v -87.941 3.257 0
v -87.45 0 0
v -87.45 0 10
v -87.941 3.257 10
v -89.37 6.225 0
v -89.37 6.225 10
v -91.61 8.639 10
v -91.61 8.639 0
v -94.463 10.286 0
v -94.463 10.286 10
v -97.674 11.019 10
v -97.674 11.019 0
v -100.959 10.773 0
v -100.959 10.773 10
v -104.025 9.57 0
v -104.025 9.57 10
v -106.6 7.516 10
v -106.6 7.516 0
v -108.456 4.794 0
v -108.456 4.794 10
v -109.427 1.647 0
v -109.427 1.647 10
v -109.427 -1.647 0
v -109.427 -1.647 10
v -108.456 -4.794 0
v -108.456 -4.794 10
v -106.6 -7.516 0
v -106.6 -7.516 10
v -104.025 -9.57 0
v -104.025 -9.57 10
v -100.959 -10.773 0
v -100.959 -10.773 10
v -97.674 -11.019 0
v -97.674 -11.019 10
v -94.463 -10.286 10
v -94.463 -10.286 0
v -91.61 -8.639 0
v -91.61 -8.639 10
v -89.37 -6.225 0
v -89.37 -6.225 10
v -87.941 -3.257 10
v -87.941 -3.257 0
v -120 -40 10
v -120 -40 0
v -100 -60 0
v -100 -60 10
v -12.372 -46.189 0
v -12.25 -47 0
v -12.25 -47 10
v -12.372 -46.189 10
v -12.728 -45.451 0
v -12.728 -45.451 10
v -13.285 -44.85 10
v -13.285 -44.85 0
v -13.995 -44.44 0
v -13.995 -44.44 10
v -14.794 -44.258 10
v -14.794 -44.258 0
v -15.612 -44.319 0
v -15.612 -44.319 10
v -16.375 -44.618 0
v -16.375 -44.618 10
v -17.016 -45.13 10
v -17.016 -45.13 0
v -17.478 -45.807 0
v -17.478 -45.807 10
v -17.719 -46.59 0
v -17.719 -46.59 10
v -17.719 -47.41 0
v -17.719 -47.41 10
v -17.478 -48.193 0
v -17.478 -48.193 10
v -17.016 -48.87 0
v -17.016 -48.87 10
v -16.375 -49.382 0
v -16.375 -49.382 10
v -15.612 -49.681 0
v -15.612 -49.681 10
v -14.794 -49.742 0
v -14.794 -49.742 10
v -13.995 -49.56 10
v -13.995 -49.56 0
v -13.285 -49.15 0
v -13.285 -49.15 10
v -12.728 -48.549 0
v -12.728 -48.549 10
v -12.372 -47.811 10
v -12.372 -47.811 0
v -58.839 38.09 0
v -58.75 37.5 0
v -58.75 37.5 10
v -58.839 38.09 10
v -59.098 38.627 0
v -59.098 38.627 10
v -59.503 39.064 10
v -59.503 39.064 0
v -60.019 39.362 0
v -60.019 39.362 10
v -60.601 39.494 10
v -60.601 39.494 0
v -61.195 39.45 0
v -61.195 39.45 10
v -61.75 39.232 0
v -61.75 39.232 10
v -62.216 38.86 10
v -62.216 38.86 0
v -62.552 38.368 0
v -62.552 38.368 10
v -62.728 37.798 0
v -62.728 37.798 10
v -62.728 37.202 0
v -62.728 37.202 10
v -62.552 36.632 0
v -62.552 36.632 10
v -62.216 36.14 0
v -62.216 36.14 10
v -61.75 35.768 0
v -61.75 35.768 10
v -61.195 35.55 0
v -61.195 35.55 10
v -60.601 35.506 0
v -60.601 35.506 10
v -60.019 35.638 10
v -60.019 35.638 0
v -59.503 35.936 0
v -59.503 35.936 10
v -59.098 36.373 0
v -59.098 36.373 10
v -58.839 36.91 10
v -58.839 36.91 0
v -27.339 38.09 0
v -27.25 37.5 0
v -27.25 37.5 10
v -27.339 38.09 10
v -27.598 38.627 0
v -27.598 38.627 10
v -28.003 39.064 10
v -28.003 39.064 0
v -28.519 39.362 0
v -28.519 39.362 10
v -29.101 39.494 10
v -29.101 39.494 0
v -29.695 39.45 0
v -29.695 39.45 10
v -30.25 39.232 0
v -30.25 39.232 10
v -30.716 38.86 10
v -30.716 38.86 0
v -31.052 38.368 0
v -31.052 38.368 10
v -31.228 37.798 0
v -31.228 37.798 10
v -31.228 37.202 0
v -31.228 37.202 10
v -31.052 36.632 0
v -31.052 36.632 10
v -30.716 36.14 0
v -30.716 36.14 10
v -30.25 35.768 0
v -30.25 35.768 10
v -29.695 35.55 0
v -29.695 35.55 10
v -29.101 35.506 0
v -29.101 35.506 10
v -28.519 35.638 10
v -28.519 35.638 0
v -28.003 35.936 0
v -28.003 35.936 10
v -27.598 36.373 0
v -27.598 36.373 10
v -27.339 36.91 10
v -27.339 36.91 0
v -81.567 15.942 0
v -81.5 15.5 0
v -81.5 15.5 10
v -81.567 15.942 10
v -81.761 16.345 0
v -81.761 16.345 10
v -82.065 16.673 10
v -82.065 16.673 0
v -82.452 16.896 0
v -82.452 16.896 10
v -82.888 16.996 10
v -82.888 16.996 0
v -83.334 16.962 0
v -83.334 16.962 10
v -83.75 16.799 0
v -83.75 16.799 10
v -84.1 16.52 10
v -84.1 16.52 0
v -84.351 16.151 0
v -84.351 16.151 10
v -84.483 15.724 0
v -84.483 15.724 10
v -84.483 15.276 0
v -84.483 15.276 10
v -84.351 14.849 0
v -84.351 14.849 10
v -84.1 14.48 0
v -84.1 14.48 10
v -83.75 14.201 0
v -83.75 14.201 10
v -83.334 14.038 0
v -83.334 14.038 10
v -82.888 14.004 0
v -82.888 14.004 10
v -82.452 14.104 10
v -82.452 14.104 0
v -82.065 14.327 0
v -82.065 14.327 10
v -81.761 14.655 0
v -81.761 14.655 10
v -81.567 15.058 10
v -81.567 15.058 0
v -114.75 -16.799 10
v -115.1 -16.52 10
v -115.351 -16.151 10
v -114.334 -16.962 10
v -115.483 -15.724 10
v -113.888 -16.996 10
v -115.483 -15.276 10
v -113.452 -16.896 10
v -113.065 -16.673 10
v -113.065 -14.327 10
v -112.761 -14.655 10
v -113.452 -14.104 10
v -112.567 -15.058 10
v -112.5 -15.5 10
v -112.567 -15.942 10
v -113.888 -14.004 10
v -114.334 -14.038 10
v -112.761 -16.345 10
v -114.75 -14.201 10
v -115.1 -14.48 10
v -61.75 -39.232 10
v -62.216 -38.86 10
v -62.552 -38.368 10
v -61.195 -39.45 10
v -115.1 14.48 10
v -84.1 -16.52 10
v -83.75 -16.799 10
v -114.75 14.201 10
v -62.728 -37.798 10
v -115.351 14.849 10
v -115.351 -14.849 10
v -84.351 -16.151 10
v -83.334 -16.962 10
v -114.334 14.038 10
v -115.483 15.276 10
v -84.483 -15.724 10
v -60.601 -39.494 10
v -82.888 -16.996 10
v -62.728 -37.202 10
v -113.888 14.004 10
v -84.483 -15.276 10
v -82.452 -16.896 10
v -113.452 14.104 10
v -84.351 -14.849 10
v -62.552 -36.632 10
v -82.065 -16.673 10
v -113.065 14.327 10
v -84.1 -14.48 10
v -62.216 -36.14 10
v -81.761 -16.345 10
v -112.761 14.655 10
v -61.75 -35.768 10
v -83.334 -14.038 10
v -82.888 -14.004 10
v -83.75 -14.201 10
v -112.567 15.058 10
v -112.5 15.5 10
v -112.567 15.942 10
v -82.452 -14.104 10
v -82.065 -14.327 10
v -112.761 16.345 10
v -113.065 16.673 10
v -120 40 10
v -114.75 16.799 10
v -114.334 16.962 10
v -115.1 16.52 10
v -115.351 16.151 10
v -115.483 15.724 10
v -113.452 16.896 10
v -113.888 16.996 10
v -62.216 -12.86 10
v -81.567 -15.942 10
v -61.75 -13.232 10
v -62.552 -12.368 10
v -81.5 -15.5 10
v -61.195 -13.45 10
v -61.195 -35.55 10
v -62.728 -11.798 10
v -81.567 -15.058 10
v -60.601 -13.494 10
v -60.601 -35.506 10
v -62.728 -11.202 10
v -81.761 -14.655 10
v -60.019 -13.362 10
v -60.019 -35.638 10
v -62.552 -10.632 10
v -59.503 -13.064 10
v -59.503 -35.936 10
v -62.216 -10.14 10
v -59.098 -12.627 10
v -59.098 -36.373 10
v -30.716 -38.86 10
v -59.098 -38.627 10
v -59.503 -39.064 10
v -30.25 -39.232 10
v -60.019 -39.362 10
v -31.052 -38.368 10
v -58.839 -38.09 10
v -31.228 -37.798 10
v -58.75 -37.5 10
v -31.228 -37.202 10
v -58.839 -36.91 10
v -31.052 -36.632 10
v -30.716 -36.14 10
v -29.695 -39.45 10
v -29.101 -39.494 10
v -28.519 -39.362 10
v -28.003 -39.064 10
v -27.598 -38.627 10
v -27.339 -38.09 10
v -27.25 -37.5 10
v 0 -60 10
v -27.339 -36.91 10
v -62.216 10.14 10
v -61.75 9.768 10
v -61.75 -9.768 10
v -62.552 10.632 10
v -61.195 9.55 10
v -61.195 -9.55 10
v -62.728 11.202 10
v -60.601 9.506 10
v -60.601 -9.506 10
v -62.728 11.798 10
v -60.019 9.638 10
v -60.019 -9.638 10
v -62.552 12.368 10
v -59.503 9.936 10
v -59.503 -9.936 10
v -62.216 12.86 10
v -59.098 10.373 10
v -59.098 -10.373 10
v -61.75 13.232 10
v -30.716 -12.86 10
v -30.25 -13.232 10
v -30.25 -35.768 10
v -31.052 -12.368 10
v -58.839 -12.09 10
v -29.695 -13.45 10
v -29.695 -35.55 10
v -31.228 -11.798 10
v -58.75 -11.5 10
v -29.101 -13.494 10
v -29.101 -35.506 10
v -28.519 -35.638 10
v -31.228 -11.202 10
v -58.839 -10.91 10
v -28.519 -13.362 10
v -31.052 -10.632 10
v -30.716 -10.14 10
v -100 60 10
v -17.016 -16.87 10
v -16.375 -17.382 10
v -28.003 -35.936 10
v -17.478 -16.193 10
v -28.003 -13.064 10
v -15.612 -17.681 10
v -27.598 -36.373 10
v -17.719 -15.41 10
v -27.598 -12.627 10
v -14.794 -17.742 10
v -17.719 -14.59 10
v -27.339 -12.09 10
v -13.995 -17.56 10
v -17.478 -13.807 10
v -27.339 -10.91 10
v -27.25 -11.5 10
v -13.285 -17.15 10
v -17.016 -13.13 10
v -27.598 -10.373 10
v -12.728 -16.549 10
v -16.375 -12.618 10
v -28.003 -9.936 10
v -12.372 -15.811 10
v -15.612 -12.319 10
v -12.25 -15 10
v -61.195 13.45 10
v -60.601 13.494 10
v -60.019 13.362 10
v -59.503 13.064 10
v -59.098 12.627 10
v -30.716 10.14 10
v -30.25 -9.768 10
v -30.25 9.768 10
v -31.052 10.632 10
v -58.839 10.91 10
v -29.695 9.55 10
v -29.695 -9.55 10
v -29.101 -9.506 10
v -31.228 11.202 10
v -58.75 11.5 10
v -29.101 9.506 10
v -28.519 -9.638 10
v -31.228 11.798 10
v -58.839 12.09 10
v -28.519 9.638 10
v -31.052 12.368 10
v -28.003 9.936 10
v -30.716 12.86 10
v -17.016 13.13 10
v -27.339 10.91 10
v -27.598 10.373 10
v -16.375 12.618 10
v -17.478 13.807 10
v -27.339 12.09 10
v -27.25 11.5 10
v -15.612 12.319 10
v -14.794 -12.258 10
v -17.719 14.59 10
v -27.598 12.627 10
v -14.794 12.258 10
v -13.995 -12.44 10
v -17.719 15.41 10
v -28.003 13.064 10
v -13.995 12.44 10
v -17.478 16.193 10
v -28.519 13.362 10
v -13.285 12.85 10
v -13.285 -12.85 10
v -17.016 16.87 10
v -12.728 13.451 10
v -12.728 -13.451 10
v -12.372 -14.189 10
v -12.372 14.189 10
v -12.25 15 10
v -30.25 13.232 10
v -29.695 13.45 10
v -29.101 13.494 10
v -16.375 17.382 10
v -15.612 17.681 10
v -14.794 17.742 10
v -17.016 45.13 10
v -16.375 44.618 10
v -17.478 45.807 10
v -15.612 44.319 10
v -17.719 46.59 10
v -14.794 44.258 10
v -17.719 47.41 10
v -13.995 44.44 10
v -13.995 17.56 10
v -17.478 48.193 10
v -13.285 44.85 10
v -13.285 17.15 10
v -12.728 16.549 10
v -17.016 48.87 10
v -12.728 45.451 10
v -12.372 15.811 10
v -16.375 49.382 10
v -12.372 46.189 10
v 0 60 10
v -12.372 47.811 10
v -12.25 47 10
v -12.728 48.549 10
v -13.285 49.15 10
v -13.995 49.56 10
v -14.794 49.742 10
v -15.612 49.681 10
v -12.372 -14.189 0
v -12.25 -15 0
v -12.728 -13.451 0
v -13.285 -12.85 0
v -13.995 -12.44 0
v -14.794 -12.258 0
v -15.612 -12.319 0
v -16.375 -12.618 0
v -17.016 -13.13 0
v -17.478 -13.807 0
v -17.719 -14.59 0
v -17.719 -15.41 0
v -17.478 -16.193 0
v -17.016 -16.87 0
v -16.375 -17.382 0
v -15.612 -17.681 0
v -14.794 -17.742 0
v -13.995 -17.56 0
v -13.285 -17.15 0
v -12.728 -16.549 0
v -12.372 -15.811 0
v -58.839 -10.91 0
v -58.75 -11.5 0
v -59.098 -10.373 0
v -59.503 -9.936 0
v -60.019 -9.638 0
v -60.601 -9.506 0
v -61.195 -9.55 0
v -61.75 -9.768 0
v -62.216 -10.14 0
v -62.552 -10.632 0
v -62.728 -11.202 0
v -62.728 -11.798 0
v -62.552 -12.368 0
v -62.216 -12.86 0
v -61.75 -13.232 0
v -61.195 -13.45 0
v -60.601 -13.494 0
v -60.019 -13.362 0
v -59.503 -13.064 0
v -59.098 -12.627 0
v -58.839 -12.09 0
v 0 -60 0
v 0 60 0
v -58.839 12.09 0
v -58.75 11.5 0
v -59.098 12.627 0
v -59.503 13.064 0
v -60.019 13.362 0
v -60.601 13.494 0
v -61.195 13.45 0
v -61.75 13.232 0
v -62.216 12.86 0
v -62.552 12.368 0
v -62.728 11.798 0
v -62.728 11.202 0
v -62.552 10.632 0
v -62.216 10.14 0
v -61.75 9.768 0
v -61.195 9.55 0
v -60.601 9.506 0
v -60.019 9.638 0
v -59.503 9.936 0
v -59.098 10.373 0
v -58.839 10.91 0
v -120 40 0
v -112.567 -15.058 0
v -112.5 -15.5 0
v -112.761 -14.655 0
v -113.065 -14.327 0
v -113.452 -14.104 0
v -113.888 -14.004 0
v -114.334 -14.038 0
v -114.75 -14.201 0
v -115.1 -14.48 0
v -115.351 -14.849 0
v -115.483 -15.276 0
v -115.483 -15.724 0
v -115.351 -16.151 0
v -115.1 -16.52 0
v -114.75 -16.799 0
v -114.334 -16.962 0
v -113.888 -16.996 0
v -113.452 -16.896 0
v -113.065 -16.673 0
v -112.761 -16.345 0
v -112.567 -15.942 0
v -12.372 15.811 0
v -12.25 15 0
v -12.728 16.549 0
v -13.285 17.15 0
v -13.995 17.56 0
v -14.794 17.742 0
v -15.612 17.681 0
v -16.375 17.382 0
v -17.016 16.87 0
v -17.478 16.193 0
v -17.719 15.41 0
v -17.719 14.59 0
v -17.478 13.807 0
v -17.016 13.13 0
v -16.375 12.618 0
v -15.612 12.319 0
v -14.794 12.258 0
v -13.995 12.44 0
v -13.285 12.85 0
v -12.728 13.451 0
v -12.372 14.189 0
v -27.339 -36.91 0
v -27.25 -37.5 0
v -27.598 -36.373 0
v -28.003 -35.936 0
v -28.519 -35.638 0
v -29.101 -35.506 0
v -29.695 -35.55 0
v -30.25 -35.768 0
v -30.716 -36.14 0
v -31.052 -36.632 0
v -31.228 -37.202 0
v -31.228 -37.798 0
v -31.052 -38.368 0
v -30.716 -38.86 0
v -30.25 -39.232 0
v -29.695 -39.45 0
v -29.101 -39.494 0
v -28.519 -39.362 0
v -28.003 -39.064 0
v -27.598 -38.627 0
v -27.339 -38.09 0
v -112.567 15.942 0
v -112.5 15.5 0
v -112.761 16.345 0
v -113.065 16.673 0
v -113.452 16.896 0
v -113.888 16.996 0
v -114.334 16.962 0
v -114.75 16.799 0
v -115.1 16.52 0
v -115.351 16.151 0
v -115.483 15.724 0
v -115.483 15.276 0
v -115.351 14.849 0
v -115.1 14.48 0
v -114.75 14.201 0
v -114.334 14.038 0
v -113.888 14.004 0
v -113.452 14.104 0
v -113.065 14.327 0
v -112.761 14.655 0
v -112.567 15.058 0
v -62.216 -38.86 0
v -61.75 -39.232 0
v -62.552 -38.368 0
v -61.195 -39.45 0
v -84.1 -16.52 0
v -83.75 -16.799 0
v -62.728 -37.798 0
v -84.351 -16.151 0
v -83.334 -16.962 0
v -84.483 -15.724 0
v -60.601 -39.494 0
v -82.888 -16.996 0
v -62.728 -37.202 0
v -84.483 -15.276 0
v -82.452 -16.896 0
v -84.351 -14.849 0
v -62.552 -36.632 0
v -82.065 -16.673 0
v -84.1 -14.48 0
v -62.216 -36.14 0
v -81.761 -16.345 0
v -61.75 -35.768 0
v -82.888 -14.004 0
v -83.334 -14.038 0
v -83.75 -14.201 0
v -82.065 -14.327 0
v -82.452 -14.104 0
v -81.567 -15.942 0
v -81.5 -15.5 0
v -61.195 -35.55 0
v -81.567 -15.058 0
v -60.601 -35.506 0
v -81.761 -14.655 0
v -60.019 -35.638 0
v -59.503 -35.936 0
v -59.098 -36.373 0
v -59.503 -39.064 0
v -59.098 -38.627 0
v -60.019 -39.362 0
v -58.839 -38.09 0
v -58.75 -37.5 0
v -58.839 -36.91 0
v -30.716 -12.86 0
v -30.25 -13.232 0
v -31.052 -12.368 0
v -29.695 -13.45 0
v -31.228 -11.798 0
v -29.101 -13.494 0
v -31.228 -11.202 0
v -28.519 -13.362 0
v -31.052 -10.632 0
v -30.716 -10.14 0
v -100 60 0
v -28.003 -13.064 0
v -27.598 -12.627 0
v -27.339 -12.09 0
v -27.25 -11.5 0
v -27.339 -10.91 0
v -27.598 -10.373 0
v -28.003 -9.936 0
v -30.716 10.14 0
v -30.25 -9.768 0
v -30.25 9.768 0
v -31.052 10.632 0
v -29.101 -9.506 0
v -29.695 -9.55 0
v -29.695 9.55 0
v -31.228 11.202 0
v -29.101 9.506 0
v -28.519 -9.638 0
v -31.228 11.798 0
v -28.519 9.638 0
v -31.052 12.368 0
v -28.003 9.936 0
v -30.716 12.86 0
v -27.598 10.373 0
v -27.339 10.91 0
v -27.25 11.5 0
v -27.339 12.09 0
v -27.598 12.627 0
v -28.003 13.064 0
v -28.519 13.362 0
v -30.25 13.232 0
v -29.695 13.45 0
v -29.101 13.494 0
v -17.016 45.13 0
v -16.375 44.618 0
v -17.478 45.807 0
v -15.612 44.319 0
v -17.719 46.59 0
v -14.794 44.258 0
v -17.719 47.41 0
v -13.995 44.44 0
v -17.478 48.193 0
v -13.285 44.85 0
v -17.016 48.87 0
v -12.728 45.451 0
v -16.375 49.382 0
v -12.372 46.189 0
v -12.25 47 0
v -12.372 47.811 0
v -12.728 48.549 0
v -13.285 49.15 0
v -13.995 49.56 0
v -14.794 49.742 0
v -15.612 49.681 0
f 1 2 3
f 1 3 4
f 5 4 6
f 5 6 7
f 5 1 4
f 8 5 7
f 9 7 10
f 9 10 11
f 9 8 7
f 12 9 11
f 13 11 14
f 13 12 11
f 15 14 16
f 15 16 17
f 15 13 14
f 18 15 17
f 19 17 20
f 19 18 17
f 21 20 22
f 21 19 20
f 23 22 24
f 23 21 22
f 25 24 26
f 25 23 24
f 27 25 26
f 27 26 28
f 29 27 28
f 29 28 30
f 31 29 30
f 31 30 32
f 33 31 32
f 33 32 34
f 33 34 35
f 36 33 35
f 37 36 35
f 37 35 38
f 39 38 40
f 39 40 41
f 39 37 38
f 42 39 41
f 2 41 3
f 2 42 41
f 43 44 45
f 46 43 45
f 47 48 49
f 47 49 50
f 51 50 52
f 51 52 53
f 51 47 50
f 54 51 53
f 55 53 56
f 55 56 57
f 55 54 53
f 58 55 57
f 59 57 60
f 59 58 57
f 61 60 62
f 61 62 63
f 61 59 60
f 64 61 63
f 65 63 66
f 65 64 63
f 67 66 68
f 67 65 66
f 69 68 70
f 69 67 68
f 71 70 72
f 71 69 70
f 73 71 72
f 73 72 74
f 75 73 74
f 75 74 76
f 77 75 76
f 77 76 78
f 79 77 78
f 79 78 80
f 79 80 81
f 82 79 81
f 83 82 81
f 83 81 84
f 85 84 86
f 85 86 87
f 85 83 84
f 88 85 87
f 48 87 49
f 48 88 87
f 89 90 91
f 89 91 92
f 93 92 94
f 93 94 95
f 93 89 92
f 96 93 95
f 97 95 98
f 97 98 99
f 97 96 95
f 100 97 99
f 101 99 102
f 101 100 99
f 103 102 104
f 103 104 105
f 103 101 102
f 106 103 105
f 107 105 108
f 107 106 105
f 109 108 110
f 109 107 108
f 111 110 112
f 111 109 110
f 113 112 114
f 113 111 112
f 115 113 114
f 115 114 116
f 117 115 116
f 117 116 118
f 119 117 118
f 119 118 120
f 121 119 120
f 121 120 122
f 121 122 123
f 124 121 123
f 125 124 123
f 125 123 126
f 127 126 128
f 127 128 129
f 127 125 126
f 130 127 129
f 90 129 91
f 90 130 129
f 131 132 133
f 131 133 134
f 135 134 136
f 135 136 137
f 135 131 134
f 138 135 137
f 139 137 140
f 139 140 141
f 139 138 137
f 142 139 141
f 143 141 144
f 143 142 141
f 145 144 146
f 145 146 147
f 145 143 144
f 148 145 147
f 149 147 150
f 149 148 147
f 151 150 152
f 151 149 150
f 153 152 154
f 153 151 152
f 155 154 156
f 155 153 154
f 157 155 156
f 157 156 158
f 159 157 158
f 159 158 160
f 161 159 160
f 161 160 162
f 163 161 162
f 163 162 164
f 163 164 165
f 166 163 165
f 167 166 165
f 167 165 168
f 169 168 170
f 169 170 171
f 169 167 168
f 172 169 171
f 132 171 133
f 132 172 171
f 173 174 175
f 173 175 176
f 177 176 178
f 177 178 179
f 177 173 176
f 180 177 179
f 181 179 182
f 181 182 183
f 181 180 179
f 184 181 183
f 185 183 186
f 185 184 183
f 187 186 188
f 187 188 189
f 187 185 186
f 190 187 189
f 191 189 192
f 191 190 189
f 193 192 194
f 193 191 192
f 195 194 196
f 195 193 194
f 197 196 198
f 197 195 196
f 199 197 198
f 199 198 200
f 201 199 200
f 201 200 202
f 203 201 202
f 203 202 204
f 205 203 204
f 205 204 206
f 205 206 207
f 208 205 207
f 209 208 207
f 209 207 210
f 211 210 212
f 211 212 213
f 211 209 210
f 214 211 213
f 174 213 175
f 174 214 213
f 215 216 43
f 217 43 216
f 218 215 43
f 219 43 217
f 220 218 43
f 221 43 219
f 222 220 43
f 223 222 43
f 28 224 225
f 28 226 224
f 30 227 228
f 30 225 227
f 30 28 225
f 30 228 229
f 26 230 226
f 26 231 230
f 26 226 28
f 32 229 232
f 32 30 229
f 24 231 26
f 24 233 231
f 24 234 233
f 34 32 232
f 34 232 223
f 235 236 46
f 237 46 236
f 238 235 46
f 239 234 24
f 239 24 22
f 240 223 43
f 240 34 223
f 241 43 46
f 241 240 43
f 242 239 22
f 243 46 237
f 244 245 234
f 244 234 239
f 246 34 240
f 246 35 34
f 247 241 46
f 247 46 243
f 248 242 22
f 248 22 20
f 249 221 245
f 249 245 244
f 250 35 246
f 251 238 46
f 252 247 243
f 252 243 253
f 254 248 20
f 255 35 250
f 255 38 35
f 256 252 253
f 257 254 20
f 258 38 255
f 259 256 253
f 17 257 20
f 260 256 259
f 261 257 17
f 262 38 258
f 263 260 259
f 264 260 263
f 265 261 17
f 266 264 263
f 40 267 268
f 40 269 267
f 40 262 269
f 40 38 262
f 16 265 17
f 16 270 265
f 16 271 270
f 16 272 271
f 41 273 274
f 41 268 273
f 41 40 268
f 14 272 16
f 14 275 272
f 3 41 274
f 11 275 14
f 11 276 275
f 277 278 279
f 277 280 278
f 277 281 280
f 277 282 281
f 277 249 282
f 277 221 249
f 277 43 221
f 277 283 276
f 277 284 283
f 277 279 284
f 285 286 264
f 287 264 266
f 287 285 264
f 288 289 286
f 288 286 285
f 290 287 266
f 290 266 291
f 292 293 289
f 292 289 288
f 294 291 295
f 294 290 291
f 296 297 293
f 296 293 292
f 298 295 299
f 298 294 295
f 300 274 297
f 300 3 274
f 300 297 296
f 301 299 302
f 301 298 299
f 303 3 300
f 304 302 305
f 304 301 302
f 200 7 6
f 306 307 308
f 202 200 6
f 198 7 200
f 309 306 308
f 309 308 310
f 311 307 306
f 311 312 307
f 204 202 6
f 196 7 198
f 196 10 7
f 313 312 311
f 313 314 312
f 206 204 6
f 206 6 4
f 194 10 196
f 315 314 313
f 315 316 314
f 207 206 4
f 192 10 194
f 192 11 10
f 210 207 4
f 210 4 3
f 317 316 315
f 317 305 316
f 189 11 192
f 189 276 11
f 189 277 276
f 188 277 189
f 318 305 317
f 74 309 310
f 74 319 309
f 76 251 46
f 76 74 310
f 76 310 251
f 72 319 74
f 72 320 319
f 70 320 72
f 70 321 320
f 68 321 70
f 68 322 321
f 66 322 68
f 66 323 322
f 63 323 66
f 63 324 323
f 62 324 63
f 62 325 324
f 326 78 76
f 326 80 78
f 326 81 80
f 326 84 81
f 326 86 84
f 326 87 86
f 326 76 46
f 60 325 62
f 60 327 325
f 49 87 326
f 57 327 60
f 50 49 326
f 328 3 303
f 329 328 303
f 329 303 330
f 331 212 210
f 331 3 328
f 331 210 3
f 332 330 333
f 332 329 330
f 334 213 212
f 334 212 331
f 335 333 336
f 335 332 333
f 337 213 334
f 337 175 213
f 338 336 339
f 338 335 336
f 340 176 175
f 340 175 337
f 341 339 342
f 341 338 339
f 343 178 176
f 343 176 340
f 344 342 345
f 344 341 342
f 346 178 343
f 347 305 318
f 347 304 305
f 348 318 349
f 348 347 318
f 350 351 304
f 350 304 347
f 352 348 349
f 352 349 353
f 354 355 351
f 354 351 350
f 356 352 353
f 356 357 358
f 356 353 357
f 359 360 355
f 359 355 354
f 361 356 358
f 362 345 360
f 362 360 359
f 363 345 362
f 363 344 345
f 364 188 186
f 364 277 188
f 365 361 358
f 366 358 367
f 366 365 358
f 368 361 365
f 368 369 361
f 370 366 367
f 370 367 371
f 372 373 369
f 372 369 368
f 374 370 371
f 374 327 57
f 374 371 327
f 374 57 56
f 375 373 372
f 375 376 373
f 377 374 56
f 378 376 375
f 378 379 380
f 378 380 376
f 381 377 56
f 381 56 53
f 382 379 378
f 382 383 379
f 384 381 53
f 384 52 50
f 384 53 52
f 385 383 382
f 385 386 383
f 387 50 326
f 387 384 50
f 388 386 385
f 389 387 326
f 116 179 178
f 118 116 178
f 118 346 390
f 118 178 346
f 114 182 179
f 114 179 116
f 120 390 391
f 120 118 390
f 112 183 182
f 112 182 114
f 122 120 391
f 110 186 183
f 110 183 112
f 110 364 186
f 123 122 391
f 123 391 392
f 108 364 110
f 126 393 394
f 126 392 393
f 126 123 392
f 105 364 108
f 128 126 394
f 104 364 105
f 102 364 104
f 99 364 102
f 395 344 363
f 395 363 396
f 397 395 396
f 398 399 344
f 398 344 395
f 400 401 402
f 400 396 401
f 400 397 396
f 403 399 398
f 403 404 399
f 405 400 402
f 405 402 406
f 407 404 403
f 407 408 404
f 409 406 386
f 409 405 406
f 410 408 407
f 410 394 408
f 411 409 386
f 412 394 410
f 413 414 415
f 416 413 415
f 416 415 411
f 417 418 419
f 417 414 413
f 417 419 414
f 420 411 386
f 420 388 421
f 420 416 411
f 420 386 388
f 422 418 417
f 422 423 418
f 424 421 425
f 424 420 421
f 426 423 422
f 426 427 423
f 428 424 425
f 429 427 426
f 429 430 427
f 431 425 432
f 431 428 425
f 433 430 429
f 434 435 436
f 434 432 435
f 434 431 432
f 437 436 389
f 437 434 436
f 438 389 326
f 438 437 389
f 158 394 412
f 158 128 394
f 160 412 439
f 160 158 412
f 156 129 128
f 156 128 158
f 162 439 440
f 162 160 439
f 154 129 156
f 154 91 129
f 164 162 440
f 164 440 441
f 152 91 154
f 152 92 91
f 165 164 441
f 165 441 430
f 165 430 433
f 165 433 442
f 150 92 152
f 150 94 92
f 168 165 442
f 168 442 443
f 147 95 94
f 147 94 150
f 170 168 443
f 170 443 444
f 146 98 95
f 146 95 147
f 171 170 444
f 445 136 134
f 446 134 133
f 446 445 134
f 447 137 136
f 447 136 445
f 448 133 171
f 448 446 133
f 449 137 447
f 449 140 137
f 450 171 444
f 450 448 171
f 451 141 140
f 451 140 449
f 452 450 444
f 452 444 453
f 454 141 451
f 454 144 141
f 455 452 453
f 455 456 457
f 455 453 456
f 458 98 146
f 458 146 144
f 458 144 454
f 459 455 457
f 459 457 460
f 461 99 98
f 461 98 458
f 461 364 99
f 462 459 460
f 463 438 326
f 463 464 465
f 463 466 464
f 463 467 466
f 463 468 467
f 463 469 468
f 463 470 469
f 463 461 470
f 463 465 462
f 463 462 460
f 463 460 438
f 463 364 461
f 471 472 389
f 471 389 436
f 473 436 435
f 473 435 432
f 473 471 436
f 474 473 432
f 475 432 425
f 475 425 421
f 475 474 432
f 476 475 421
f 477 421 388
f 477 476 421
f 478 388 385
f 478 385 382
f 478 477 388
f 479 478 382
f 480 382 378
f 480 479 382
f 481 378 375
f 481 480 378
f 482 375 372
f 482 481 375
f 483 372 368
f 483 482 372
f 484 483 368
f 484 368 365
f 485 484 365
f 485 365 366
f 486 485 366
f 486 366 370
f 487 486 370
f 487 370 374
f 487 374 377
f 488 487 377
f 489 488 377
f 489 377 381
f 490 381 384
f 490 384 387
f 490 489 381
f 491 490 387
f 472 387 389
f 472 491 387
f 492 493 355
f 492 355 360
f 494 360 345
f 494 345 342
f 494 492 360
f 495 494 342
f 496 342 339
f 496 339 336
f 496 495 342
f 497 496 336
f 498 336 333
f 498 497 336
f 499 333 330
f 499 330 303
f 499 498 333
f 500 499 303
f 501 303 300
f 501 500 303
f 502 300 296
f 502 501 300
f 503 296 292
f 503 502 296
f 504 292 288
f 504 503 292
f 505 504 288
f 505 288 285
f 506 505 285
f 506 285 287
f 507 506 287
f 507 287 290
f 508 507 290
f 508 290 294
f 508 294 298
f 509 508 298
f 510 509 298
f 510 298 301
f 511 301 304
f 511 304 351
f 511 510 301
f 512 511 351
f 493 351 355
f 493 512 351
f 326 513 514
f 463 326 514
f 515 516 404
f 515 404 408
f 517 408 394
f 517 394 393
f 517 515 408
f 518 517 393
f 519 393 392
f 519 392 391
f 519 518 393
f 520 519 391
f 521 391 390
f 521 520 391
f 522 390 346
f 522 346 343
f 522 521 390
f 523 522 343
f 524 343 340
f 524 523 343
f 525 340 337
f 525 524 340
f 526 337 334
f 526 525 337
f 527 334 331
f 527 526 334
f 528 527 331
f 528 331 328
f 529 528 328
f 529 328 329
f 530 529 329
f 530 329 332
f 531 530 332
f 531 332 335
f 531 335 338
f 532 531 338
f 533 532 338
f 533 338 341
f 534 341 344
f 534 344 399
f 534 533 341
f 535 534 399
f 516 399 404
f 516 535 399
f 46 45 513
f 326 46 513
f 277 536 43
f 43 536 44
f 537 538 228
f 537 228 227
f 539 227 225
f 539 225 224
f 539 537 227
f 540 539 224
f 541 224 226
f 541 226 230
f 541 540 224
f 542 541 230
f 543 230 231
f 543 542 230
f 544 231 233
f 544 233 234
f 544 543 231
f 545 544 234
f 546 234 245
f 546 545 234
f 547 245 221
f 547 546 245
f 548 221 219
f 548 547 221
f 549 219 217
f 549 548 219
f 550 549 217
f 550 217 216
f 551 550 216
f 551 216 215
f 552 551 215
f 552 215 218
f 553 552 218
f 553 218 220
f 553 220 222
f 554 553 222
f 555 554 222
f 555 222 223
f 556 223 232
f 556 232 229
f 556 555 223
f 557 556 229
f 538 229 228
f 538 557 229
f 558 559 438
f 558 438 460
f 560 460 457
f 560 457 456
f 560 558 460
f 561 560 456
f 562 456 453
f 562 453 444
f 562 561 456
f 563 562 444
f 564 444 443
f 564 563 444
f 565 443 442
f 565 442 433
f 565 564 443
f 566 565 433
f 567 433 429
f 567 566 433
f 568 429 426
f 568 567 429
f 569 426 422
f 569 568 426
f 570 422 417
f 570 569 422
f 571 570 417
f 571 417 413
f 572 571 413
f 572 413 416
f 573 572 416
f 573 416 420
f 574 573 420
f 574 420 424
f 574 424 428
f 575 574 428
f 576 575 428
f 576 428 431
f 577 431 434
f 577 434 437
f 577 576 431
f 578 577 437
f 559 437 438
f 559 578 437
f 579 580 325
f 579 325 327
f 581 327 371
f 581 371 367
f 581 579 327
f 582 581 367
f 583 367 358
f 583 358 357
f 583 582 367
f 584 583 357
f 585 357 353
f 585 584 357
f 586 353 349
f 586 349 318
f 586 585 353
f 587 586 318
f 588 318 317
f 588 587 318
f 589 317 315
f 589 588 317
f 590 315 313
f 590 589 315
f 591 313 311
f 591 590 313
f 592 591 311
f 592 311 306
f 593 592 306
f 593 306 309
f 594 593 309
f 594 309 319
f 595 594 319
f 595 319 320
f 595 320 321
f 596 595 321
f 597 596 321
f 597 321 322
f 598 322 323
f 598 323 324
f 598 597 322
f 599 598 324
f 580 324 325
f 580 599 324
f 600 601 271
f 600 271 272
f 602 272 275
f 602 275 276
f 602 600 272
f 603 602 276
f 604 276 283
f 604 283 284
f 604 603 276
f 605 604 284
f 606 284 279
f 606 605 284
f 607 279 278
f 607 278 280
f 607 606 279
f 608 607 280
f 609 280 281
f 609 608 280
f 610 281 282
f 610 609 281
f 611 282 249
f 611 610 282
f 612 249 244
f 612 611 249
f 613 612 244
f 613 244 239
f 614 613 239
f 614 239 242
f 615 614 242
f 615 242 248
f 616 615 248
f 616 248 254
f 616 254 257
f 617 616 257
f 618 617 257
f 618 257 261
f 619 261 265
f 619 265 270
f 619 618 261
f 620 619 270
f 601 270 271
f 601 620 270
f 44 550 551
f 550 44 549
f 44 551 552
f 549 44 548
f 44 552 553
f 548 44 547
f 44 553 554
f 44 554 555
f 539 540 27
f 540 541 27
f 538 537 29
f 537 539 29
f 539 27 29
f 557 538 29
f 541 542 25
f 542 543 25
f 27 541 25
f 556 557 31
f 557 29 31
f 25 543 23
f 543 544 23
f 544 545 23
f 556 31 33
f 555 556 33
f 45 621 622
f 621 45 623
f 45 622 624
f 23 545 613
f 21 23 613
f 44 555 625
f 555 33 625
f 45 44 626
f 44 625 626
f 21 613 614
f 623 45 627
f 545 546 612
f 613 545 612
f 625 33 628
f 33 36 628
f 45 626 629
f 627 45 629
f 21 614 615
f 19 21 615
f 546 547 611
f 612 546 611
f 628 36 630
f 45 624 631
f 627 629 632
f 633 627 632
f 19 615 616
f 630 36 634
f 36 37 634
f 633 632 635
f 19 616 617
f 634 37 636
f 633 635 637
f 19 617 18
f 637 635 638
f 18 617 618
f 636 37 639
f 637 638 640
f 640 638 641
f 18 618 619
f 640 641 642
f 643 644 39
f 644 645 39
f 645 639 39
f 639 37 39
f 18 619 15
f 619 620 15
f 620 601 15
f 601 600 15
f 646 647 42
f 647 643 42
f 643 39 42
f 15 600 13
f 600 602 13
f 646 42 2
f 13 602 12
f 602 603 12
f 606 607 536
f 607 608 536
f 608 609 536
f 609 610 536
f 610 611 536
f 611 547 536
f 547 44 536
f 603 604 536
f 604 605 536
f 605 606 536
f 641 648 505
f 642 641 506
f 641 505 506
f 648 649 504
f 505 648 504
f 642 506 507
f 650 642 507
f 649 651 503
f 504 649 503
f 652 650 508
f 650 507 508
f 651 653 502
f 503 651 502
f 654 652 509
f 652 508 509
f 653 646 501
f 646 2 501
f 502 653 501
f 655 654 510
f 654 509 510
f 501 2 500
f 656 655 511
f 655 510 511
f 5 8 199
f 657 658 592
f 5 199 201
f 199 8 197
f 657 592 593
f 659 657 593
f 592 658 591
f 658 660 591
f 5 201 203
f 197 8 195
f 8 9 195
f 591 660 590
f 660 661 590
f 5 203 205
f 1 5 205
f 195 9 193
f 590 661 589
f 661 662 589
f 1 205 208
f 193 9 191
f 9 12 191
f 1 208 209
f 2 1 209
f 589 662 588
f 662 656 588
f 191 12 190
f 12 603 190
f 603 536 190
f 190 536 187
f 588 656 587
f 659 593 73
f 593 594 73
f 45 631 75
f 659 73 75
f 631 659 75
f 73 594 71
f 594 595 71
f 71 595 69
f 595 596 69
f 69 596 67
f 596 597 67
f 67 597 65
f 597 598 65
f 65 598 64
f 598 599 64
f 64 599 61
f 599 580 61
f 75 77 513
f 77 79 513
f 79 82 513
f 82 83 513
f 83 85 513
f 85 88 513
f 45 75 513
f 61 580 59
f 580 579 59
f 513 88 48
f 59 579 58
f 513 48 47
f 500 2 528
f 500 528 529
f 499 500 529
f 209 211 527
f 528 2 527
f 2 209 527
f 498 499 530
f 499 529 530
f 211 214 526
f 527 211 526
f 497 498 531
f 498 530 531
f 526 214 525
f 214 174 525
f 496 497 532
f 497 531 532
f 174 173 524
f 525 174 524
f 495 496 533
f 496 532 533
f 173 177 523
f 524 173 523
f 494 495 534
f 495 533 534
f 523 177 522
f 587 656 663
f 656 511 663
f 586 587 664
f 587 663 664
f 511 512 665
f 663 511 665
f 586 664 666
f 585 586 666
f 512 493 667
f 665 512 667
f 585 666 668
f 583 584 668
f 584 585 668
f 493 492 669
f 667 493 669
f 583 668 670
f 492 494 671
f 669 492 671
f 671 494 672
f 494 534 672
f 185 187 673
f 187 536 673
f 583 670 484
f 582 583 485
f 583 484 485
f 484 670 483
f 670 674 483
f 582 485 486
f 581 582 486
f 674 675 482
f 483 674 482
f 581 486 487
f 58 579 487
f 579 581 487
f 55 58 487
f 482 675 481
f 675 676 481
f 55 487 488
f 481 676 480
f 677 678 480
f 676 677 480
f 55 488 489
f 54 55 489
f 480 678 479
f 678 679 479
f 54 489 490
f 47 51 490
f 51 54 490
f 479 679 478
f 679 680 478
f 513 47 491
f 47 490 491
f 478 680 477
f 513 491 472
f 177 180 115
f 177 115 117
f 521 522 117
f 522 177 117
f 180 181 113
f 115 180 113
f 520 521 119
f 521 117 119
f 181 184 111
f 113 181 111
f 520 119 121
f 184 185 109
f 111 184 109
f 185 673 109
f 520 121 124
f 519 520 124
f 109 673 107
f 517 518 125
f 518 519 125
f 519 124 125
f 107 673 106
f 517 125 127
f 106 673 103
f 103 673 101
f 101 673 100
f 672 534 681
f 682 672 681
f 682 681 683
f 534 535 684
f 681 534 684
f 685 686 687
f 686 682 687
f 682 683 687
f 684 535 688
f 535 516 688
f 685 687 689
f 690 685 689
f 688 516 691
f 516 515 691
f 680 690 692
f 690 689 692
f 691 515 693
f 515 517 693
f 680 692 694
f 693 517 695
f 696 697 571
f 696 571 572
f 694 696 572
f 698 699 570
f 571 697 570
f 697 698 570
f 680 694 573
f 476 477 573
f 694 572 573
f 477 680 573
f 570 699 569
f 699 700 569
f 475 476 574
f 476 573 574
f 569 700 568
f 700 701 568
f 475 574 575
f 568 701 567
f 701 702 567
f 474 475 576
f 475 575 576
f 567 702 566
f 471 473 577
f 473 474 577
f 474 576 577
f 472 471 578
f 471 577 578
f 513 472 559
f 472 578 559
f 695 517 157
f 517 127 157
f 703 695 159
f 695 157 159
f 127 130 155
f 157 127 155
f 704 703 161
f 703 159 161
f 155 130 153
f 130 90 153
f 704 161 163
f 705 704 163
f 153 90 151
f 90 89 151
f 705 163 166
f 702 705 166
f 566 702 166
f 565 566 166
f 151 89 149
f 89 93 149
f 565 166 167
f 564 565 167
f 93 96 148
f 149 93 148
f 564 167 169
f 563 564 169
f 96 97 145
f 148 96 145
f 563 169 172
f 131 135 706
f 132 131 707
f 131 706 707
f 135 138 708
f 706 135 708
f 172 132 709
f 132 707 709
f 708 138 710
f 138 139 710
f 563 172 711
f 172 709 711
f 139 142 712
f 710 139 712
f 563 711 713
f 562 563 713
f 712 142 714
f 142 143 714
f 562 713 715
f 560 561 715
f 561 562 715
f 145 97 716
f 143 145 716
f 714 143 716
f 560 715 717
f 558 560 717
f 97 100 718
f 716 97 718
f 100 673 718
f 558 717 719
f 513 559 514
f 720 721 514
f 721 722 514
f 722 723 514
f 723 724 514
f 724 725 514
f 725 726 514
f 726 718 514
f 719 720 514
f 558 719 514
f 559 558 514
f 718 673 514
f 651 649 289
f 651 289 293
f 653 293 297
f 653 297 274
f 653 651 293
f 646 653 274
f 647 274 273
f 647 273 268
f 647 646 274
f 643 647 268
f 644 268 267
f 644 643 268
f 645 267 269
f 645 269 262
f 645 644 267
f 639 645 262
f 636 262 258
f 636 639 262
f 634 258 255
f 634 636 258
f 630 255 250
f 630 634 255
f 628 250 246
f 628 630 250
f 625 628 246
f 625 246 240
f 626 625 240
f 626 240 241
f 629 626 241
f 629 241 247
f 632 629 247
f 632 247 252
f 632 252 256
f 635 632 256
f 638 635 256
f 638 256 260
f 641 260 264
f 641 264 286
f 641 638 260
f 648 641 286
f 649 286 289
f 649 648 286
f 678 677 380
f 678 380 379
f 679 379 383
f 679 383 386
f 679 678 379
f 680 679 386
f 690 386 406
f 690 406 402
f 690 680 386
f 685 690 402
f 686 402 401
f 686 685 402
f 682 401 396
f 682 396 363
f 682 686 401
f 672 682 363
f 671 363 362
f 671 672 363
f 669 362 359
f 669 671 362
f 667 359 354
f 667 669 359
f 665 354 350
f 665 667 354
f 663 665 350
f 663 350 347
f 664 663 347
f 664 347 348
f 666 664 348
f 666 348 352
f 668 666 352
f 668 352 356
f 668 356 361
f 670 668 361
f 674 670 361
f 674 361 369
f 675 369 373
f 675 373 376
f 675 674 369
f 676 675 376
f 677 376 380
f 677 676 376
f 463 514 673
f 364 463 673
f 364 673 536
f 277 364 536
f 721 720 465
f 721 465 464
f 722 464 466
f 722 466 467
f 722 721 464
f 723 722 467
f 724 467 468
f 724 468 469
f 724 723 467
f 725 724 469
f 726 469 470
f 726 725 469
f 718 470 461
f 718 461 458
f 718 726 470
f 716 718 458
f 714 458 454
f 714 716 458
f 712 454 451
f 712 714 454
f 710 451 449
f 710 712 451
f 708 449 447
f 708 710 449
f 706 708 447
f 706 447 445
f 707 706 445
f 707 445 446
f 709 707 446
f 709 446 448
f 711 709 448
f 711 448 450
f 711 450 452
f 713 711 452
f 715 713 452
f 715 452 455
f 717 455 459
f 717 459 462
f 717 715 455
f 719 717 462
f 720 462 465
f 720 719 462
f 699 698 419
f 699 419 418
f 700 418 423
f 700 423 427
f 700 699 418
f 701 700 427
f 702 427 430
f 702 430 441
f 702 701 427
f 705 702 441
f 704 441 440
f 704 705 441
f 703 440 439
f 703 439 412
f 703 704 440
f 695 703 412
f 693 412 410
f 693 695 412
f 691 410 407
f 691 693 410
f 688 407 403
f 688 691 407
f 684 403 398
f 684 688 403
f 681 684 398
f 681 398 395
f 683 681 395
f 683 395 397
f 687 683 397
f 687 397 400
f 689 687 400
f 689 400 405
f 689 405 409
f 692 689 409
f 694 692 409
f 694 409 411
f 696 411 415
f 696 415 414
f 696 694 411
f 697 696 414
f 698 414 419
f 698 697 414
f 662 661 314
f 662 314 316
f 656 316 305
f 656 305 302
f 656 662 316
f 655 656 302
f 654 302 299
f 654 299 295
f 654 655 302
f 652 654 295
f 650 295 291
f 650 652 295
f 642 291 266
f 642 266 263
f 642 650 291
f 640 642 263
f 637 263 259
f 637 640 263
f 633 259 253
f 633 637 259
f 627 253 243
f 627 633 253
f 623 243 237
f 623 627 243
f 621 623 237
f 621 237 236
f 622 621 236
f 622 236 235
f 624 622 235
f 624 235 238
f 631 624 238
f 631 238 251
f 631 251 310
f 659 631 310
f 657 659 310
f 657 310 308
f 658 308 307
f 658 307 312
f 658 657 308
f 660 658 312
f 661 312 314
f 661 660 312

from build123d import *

# Parameters (mm, degrees)
SKETCH1_R           = 11.05
SKETCH1_R_2         = 1.5
SKETCH1_R_3         = 2
SKETCH1_R_4         = 2.75
BOSS_EXTRUDE1_DEPTH = 10


with BuildPart() as part:
    # Sketch1 → Boss-Extrude1 (new body)
    with BuildSketch(Plane.XY):
        Polygon((0, -60), (0, 60), (-100, 60), (-120, 40), (-120, -40), (-100, -60), align=None)
        with Locations((-98.5, 0)):
            Circle(SKETCH1_R, mode=Mode.SUBTRACT)
        with Locations((-83, 15.5)):
            Circle(SKETCH1_R_2, mode=Mode.SUBTRACT)
        with Locations((-114, 15.5)):
            Circle(SKETCH1_R_2, mode=Mode.SUBTRACT)
        with Locations((-114, -15.5)):
            Circle(SKETCH1_R_2, mode=Mode.SUBTRACT)
        with Locations((-83, -15.5)):
            Circle(SKETCH1_R_2, mode=Mode.SUBTRACT)
        with Locations((-60.75, 37.5)):
            Circle(SKETCH1_R_3, mode=Mode.SUBTRACT)
        with Locations((-29.25, 37.5)):
            Circle(SKETCH1_R_3, mode=Mode.SUBTRACT)
        with Locations((-60.75, 11.5)):
            Circle(SKETCH1_R_3, mode=Mode.SUBTRACT)
        with Locations((-29.25, 11.5)):
            Circle(SKETCH1_R_3, mode=Mode.SUBTRACT)
        with Locations((-60.75, -11.5)):
            Circle(SKETCH1_R_3, mode=Mode.SUBTRACT)
        with Locations((-29.25, -11.5)):
            Circle(SKETCH1_R_3, mode=Mode.SUBTRACT)
        with Locations((-29.25, -37.5)):
            Circle(SKETCH1_R_3, mode=Mode.SUBTRACT)
        with Locations((-60.75, -37.5)):
            Circle(SKETCH1_R_3, mode=Mode.SUBTRACT)
        with Locations((-15, 47)):
            Circle(SKETCH1_R_4, mode=Mode.SUBTRACT)
        with Locations((-15, 15)):
            Circle(SKETCH1_R_4, mode=Mode.SUBTRACT)
        with Locations((-15, -15)):
            Circle(SKETCH1_R_4, mode=Mode.SUBTRACT)
        with Locations((-15, -47)):
            Circle(SKETCH1_R_4, mode=Mode.SUBTRACT)
    extrude(amount=BOSS_EXTRUDE1_DEPTH)


solid = part.part
